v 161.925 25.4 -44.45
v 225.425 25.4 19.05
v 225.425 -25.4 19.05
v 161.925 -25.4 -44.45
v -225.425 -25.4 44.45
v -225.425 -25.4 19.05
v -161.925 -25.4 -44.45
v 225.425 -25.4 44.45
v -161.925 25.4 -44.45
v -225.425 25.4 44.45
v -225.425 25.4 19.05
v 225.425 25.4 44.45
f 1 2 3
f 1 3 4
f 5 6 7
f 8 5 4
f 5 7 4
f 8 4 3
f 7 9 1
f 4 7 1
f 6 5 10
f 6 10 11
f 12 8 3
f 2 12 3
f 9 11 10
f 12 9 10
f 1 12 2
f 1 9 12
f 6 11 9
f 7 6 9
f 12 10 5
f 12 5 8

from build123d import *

# Parameters (mm, degrees)
SKETCH1_W           = 450.85
SKETCH1_H           = 88.9
BOSS_EXTRUDE1_DEPTH = 25.4
CUT_EXTRUDE1_DEPTH  = 51.8


with BuildPart() as part:
    # Sketch1 → Boss-Extrude1 (new body, symmetric)
    with BuildSketch(Plane(origin=(0, 0, 0), x_dir=(1, 0, 0), z_dir=(0, 1, 0))):
        Rectangle(SKETCH1_W, SKETCH1_H)
    extrude(amount=BOSS_EXTRUDE1_DEPTH, both=True)

    # Sketch2 → Cut-Extrude1 (cut, through all)
    with BuildSketch(Plane(origin=(0, 25.4, 0), x_dir=(1, 0, 0), z_dir=(0, 1, 0))):
        Polygon((-225.425, 44.45), (-225.425, -19.05), (-161.925, 44.45), align=None)
        Polygon((225.425, -19.05), (161.925, 44.45), (225.425, 44.45), align=None)
    extrude(amount=-CUT_EXTRUDE1_DEPTH, mode=Mode.SUBTRACT)


solid = part.part
